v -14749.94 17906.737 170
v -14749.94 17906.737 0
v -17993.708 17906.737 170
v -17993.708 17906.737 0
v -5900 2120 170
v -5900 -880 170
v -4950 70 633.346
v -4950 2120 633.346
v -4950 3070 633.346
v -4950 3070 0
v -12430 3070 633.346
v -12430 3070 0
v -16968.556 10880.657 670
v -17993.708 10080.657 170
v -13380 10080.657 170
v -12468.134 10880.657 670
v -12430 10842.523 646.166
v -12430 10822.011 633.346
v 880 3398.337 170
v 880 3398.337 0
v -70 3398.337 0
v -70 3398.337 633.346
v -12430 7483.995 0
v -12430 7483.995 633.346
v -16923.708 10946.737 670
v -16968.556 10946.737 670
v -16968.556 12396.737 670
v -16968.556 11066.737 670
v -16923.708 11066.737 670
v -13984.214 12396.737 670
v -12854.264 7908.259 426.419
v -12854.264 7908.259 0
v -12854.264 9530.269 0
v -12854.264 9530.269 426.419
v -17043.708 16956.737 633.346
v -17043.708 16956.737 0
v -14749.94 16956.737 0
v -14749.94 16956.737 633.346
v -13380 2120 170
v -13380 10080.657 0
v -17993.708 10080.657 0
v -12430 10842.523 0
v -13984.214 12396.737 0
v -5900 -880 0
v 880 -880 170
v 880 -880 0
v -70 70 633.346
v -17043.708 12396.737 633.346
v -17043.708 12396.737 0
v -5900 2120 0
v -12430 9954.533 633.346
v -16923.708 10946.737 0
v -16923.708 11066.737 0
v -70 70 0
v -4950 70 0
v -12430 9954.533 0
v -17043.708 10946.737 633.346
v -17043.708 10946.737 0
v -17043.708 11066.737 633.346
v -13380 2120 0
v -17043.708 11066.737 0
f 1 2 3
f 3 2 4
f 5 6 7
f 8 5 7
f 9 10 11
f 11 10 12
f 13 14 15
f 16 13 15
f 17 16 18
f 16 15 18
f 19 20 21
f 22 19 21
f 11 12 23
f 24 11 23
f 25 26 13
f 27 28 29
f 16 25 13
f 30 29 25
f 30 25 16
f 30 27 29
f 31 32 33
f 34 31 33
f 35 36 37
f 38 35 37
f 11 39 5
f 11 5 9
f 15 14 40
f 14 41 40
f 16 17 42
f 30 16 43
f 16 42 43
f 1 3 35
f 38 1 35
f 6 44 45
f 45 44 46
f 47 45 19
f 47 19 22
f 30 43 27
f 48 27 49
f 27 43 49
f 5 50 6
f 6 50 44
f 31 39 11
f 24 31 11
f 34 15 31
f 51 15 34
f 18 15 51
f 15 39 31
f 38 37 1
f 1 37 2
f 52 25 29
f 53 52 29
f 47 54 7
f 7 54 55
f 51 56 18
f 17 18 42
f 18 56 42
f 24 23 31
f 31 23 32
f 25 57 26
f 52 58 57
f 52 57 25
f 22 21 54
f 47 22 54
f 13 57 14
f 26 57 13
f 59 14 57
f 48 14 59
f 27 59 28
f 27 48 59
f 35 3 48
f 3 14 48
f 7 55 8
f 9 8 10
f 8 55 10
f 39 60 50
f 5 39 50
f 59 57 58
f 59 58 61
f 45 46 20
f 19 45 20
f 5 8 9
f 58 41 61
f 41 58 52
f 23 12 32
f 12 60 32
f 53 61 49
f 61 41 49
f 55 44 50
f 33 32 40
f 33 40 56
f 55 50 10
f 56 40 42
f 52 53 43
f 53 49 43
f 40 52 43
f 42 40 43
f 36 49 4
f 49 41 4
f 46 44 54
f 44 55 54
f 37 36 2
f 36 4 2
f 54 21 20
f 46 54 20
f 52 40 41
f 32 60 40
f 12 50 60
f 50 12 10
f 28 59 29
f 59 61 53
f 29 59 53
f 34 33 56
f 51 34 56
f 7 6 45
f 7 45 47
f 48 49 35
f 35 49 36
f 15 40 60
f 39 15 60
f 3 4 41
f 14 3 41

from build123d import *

# Parameters (mm, degrees)
F0_W        = 120
F0_H        = 120
F1_DEPTH    = 670
F2_T1_DEPTH = 3000
F2_T3_DEPTH = 4278.3373567146
F2_T5_DEPTH = 7960.6570053101
F2_T7_DEPTH = 7826.079643853
F3_T1_DEPTH = 10040.4964600443
F3_T3_DEPTH = 7529.4166998783
F3_T8_DEPTH = 12715.6483808339
F4_SIZE2    = 500
F4_SIZE     = 800


# Not quite as in the source:
# - a fillet or chamfer that OpenCascade refuses, or shapes differently, is made with other operations: its cross-section is extruded or revolved along the edge and cut away or added


with BuildPart() as f1:
    # F0 (on Top) → F1 (new body)
    with BuildSketch(Plane.XY):
        Polygon((-13984.2135623731, 12396.7366491631), (-17043.7082375624, 12396.7366491631), (-17043.7082375624, 16956.7366491631), (-14749.9399185181, 16956.7366491631), (-14749.9399185181, 17026.7366491631), (-14749.9399185181, 17906.7366491631), (-17993.7082375624, 17906.7366491631), (-17993.7082375624, 10080.6570053101), (-13380, 10080.6570053101), (-13380, 2120), (-5900, 2120), (-5900, -880), (880, -880), (880, 3398.3373567146), (-70, 3398.3373567146), (-70, 70), (-4950, 70), (-4950, 3070), (-12430, 3070), (-12430, 7483.9949493661), (-12854.2640687119, 7908.259018078), (-12854.2640687119, 9530.2691193458), (-12430, 9954.5331880577), (-12430, 10842.52308679), align=None)
        with Locations((-16983.7082375624, 11006.7366491631)):
            Rectangle(F0_W, F0_H, mode=Mode.SUBTRACT)
    extrude(amount=F1_DEPTH)

    # F2: chamfer of 500 x 1025.1519207896 on 4 edges, made by hand

    # F2_s2 → F2_t1 (cut)
    with BuildSketch(Plane.XZ.offset(-2120)):
        with BuildLine():
            Line((-5936.8560177183, 152.024119074), (-4837.992061492, 687.975880926))
            Line((-4837.992061492, 687.975880926), (-4837.992061492, 708.4789193418))
            ThreePointArc((-4837.992061492, 708.4789193418), (-5368.996030746, 690.5030384158), (-5900, 690.5030384158))
            Line((-5900, 690.5030384158), (-5920.5030384158, 670))
            ThreePointArc((-5920.5030384158, 670), (-5920.5030384158, 411.012059537), (-5957.3590561341, 152.024119074))
            Line((-5957.3590561341, 152.024119074), (-5936.8560177183, 152.024119074))
        make_face()
    extrude(amount=F2_T1_DEPTH, mode=Mode.SUBTRACT)

    # F2_s4 → F2_t3 (cut)
    with BuildSketch(Plane.XZ.offset(-3398.3373567146)):
        with BuildLine():
            Line((916.8560177183, 152.024119074), (-182.007938508, 687.975880926))
            Line((-182.007938508, 687.975880926), (-182.007938508, 708.4789193418))
            ThreePointArc((-182.007938508, 708.4789193418), (348.996030746, 690.5030384158), (880, 690.5030384158))
            Line((880, 690.5030384158), (900.5030384158, 670))
            ThreePointArc((900.5030384158, 670), (900.5030384158, 411.012059537), (937.3590561341, 152.024119074))
            Line((937.3590561341, 152.024119074), (916.8560177183, 152.024119074))
        make_face()
    extrude(amount=F2_T3_DEPTH, mode=Mode.SUBTRACT)

    # F2_s6 → F2_t5 (cut)
    with BuildSketch(Plane.XZ.offset(-10080.6570053101)):
        with BuildLine():
            Line((-13416.8560177183, 152.024119074), (-12317.992061492, 687.975880926))
            Line((-12317.992061492, 687.975880926), (-12317.992061492, 708.4789193418))
            ThreePointArc((-12317.992061492, 708.4789193418), (-12848.996030746, 690.5030384158), (-13380, 690.5030384158))
            Line((-13380, 690.5030384158), (-13400.5030384158, 670))
            ThreePointArc((-13400.5030384158, 670), (-13400.5030384158, 411.012059537), (-13437.3590561341, 152.024119074))
            Line((-13437.3590561341, 152.024119074), (-13416.8560177183, 152.024119074))
        make_face()
    extrude(amount=F2_T5_DEPTH, mode=Mode.SUBTRACT)

    # F2_s8 → F2_t7 (cut)
    with BuildSketch(Plane.XZ.offset(-17906.7366491631)):
        with BuildLine():
            Line((-18030.5642552807, 152.024119074), (-16931.7002990544, 687.975880926))
            Line((-16931.7002990544, 687.975880926), (-16931.7002990544, 708.4789193418))
            ThreePointArc((-16931.7002990544, 708.4789193418), (-17462.7042683084, 690.5030384158), (-17993.7082375624, 690.5030384158))
            Line((-17993.7082375624, 690.5030384158), (-18014.2112759782, 670))
            ThreePointArc((-18014.2112759782, 670), (-18014.2112759782, 411.012059537), (-18051.0672936965, 152.024119074))
            Line((-18051.0672936965, 152.024119074), (-18030.5642552807, 152.024119074))
        make_face()
    extrude(amount=F2_T7_DEPTH, mode=Mode.SUBTRACT)

    # F3: chamfer of 500 x 1025.1519207896 on 3 edges, made by hand

    # F3_s2 → F3_t1 (cut)
    with BuildSketch(Plane.YZ.offset(-7530.2482300221)):
        Polygon((-880, 170), (145.1519207896, 670), (-880, 670), align=None)
    extrude(amount=F3_T1_DEPTH, mode=Mode.SUBTRACT)

    # F3_s4 → F3_t3 (cut)
    with BuildSketch(Plane.YZ.offset(-19623.9564675845)):
        Polygon((17906.7366491631, 170), (16881.5847283734, 670), (17906.7366491631, 670), align=None)
    extrude(amount=F3_T3_DEPTH, mode=Mode.SUBTRACT)


with BuildPart() as f3_tool6:
    # F3_s7 → F3_t8 (new body)
    with BuildSketch(Plane.YZ.offset(-15010.2482300221)):
        Polygon((2120, 170), (3145.1519207896, 670), (2120, 670), align=None)
    extrude(amount=F3_T8_DEPTH)

    split(bisect_by=Plane(origin=(-1200.779561846, 0, 2461.9629485426), x_dir=(0, 1, 0), z_dir=(-0.4383711468, 0, 0.8987940463)), keep=Keep.TOP)


with BuildPart() as f1_1:
    add(f1.part)

    # F3_t5: cut F3_tool6
    add(f3_tool6.part, mode=Mode.SUBTRACT)

    # F4
    f4_edges = [f1_1.edges().sort_by_distance(p)[0] for p in [
        (-14699.278158, 10080.657005, 670),
    ]]
    f4_side = f1_1.faces().sort_by_distance((-14925.443793, 11155.7049, 670))[0]
    chamfer(f4_edges, length=F4_SIZE, length2=F4_SIZE2, reference=f4_side)


solid = f1_1.part
